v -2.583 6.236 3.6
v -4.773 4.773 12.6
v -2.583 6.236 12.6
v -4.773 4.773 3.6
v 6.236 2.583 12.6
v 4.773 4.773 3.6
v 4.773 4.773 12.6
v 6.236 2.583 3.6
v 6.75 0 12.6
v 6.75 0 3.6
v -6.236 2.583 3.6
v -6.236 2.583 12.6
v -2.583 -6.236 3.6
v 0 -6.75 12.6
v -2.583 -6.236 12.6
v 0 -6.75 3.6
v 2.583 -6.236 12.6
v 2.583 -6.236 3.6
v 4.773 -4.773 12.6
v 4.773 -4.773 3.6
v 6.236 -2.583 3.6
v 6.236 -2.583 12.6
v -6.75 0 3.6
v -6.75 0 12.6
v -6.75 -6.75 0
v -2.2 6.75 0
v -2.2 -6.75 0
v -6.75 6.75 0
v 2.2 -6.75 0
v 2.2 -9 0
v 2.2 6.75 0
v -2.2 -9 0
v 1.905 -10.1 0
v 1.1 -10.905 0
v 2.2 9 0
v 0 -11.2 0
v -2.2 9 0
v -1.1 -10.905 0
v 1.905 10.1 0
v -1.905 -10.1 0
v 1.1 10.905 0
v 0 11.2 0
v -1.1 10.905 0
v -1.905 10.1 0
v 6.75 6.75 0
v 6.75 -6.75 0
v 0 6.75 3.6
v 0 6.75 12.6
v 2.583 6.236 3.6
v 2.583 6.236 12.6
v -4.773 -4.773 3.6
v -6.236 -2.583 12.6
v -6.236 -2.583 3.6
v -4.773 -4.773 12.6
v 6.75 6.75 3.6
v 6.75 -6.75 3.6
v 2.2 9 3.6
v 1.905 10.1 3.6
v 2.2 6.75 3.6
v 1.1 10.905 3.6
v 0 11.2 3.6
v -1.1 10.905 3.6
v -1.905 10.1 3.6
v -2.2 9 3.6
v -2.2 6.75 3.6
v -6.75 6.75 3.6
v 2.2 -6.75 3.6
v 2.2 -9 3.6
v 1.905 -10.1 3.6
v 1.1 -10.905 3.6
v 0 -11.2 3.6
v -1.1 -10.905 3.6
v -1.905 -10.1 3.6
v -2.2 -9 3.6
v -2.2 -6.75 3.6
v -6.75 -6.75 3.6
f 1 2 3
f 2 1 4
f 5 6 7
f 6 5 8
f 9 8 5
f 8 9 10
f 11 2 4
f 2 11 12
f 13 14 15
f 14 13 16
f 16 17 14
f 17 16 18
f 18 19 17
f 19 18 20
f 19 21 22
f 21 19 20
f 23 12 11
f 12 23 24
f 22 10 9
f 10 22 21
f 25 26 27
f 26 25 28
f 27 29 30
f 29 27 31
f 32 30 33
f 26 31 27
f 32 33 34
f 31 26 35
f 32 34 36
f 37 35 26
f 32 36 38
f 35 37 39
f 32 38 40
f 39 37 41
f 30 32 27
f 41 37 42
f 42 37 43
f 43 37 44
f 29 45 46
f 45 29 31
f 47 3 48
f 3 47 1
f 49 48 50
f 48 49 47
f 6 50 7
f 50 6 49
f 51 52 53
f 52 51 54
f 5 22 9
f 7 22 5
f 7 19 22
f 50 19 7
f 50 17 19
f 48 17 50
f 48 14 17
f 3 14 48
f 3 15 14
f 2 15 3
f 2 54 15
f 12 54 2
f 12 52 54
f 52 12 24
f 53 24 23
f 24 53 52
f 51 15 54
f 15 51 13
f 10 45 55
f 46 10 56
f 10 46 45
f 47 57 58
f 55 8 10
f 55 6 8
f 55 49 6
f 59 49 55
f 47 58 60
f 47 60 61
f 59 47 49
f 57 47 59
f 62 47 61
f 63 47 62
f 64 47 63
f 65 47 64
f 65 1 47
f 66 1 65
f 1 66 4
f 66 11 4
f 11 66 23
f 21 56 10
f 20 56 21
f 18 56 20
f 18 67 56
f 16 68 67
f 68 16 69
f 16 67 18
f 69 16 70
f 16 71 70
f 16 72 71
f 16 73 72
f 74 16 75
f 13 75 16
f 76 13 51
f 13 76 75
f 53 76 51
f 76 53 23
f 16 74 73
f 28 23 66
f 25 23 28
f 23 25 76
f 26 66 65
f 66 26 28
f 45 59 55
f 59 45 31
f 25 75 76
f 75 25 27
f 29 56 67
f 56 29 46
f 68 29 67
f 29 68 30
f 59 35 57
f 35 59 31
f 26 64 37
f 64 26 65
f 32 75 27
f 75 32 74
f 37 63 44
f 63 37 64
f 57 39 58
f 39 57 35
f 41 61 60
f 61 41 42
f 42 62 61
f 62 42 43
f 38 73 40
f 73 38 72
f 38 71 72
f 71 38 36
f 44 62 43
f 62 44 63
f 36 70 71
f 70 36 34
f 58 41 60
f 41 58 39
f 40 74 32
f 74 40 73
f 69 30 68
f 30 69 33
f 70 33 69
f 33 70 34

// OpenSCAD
// file: ../libdict.scad
// This library add dictionary like features to openscad
// the dictionary is a list of pairs as we cannot define new types.
// Unlike a python dictionary we cannot do a proper hash table for speed
// so everything is build around the OpenSCAD search function
// There are a lot of assert statements to ensure data in the "dictionary"
// is in the format of
// * A list of lists
// * Each internal list has a length of two
// * First element of each internal list is a string (the key)
// * All keys are unique.


// Private function:
// This function returns true if the value is in the list
// value must be a string.
// No error checking, for use by is_in only!
function _is_in_str(value, list) =
    search([value], list) != [[]];

// Private function:
// This function returns true if the value is in the list
// value must be a number.
// No error checking, for use by is_in only!
function _is_in_num(value, list) =
    search(value, list) != [];


// This function returns true if the value is in the list
// value must be a string or a number.
function is_in(value, list) =
    assert(is_num(value) || is_string(value) , "is_in: value must be a number or string")
    assert(is_list(list), "is_in: list must be a list")
    is_num(value) ? _is_in_num(value, list) : _is_in_str(value, list);

/**
 * Sum a list
 * This recursive function sums a list.  It should be called with one
 * argument (the list); the other two arguments simply allow it to be
 * "tail-recursive" which lets OpenSCAD optimise it better.  This is
 * very close to the example given in the OpenSCAD docs.
 */
function _libdict_sum_list(list, starting_element=0, running_total=0) =
    starting_element >= len(list) ?
        running_total :
        _libdict_sum_list(list, starting_element + 1, running_total + list[starting_element]);

/**
 * When checking a list for uniqueness, we can get "errant matches".
 * An errant match is when a non-list matches with the first element in a list.
 * i.e. it would consider [1, [1,0]] to be non-unique. We cannot know which 
 * element is the non-list but we do know that it is errant if exactly one 
 * of them is not a list.
 * If two elements are non-lists, they must be identical in order to have matched.  
 * Similarly, if all elements are lists, they must be identical because ``search`` 
 * will have matched them as whole lists.
 * The argument "list" is the list we are checking for uniqueness, and "match" is 
 * a vector of indices that have been returned by ``search``.
 */
function _check_errant_match(list, match) = let(
    non_list = [for (m = match) is_list(list[m])? 0 : 1],
    number_of_non_lists = _libdict_sum_list(non_list)
) number_of_non_lists == 1 ? 0 : 1;

// Returns true if all emements in list are unique.
function is_unique(list) =
    assert(is_list(list), "is_unique: list must be a list")
    let(
        matches = search(list, list, 0),
        // Assign 1 or 0 depending on is the match length for each element
        // return wether any matches are greater than one (mathcing more than
        // itself)
        // note cannot search for true or false so using 1 and zero
        bool_list = [for (match = matches) if (len(match)==1) 0
            // should put a 1 here to show they matched but in the case of
            // [1, [1]] it will match both, so need to check if they are
            // both lists or both not list
            else _check_errant_match(list, match)]
    ) !is_in(1, bool_list);

// Private function:
// Checks that the input is a list and that every element is a list
// of length 2.
// No error checking, for use by valid_dict only!
function _is_pairs(list) =
    !is_list(list) ? false :
        len(list)==0 ? false :
            !is_in(0, [for (pair = list) is_list(pair) && len(pair)==2 ? 1: 0]);

// Private function:
// Checks all elements in the list are strings
// No error checking, for use by valid_dict only!
// Strings can't be empty
function _is_list_of_strings(list) =
    !is_in(0, [for (item = list) is_string(item) && len(item)>0 ? 1: 0]);

// Private function:
// Returns the keus in a dictionary
// No error checking, for use by valid_dict only!
function _keylist(dict)  = [for (pair=dict) pair[0]];

function valid_dict(dict) =
    //if the input are not pairs return instantly
    !_is_pairs(dict) ? false : let (
        //if they are pairs get all keys
        keys = _keylist(dict),
        all_strings =  _is_list_of_strings(keys),
        unique = is_unique(keys)
    ) (all_strings && unique) ? true : false;

// Key lookup for key value pair "dictionary".
// Unlike the built in lookup this works with strings.
function key_lookup(key, dict) =
    assert(is_string(key), "`key` must be a string")
    assert(valid_dict(dict), "`dict` must be a valid 'dictionary'")
    let(
        // key is in [] because otherwise openscad will search for each letter rather than the string.
        index = search([key], dict, 1, 0)[0]
    )  assert (index!=[], "Key lookup failed, key not found!") dict[index][1];

// Creates a new dictionary with a key value pair replaced. Pair must already
// be in dictionary.
function replace_value(key, value, dict) =
    assert(is_string(key), "`key` must be a string")
    assert(valid_dict(dict), "`dict` must be a valid 'dictionary'")
    assert(is_in(key, _keylist(dict)), "`key` not found in dictionary!")
    [for (kv_pair = dict) key!=kv_pair[0] ? kv_pair : [key, value]];


// Creates a new dictionary with a a set of key value pair replaced
// both inputs must be a dictionary. All keys in input must already be
// in dictionary
function replace_multiple_values(rep_dict, dict) =
    assert(valid_dict(rep_dict), "`rep dict` must be a valid 'dictionary'")
    assert(valid_dict(dict), "`dict` must be a valid 'dictionary'")
    let(
        // loop over all keys in replacement dict checking they are in the original
        rep_keys = [for (key = _keylist(rep_dict))
            assert(is_in(key, _keylist(dict)), "`key` not found in dictionary!")
            key
        ]
    ) //Finally return the updated dictionary using this long list comprehension.
    [
        for (kv_pair = dict) let(
            key = kv_pair[0],
            // check if this key is in the replacement dictionary and if so return index
            // key is in [] because otherwise openscad will search for each letter rather
            // than the string.
            index = search([key], rep_dict, 1, 0)[0]
            // if index is empty return original key value pair, else return the key with
            // the replaced value
        ) index == [] ? kv_pair : [key, rep_dict[index][1]]
    ];
// main file
/******************************************************************
*                                                                 *
* OpenFlexure Microscope: USB camera push-fit mount               *
*                                                                 *
* This is part of the OpenFlexure microscope, an open-source      *
* microscope and 3-axis translation stage.  It gets really good   *
* precision over a ~10mm range, by using plastic flexure          *
* mechanisms.                                                     *
*                                                                 *
* This file defines one useful function, usbcam_push_fit().  It's *
* designed to be subtracted from a solid block, with the bottom   *
* of the block at z=0.  It grips the plastic camera housing with  *
* a "trylinder" gripper, holding it in securely.  It might be     *
* that you need a cover or something to secure the camera fully.  *
*                                                                 *
* (c) Richard Bowman, January 2016                                *
* Released under the CERN Open Hardware License                   *
*                                                                 *
******************************************************************/


use <../utilities.scad>
use <../libdict.scad>


/**
* y-position of the lugs for mounting screws
*/
function m12_lens_holder_mounting_screw_y() = 9;
/**
* Radius of the mounting lugs
*/
function m12_lens_holder_mounting_screw_lug_r() = 2.2;


$fn=32;

function m12_camera_dict() = [["mount_height", 4],
                              ["sensor_height", 0.5]];//Height of the sensor above the PCB

module usbcam_lens_mount(){
    // the tube into which the lens screws
    lens_holder_tube_r = 13.5/2;
    // the height of the tube above the PCB
    lens_holder_tube_h = 12.6;
    lens_holder_box_h = 3.6;
    // box at the bottom of the tube
    lens_holder_box = [2,2,0] * lens_holder_tube_r + [0,0,1] * lens_holder_box_h;
    union(){
        cylinder(r=lens_holder_tube_r, h=lens_holder_tube_h, $fn=16);
        translate_z(lens_holder_box_h/2){
            cube(lens_holder_box, center=true);
        }
        hull(){
            reflect_y(){
                translate_y(m12_lens_holder_mounting_screw_y()){
                    cylinder(r=m12_lens_holder_mounting_screw_lug_r(), h=lens_holder_box_h, $fn=12);
                }
            }
        }
    }
}
usbcam_lens_mount();

module m12_camera_mount(){
    h = key_lookup("mount_height", m12_camera_dict());
    sy = m12_lens_holder_mounting_screw_y();
    sr = m12_lens_holder_mounting_screw_lug_r()+0.5;
    box_w = 13.2 + 1;
    sensor_w = 10 + 0.8;
    solder_w = (box_w-1.2*2);
    translate_z(-h){
        difference(){
            linear_extrude(h+tiny()){
                difference(){
                    union(){
                        square(box_w, center=true);
                        hull(){
                            reflect([0,1]){
                                translate([0,sy]){
                                    circle(r=sr, $fn=16);
                                }
                            }
                        }
                    }
                    //screws
                    reflect([0,1]){
                        translate([0,sy]){
                            circle(d=1.5, $fn=16);
                        }
                    }
                }
            }
            //chamfer the screw holes
            reflect_y(){
                translate_y(sy){
                    cylinder(r1=3, r2=0,h=4, center=true);
                    deformable_hole_trylinder(1.5/2,2.1/2,h=12, center=true);
                }
            }
            // enlarge the cut out for the sensor
            // NB the solder terminals will distort the thin bottom, this
            // is intentional, to help with bed adhesion
            cube([sensor_w, sensor_w, 2],center=true);
            sequential_hull(){
                translate_z(0.7){
                    cube([solder_w,solder_w,tiny()],center=true);
                }
                translate_z(0.7+(solder_w-sensor_w)/2){
                    cube([sensor_w, sensor_w, tiny()],center=true);
                }
                translate_z(2){
                    cube([sensor_w, sensor_w, tiny()],center=true);
                }
                translate_z(h+tiny()){
                    cylinder(r=5,h=tiny());
                }
            }
        }
    }
}
